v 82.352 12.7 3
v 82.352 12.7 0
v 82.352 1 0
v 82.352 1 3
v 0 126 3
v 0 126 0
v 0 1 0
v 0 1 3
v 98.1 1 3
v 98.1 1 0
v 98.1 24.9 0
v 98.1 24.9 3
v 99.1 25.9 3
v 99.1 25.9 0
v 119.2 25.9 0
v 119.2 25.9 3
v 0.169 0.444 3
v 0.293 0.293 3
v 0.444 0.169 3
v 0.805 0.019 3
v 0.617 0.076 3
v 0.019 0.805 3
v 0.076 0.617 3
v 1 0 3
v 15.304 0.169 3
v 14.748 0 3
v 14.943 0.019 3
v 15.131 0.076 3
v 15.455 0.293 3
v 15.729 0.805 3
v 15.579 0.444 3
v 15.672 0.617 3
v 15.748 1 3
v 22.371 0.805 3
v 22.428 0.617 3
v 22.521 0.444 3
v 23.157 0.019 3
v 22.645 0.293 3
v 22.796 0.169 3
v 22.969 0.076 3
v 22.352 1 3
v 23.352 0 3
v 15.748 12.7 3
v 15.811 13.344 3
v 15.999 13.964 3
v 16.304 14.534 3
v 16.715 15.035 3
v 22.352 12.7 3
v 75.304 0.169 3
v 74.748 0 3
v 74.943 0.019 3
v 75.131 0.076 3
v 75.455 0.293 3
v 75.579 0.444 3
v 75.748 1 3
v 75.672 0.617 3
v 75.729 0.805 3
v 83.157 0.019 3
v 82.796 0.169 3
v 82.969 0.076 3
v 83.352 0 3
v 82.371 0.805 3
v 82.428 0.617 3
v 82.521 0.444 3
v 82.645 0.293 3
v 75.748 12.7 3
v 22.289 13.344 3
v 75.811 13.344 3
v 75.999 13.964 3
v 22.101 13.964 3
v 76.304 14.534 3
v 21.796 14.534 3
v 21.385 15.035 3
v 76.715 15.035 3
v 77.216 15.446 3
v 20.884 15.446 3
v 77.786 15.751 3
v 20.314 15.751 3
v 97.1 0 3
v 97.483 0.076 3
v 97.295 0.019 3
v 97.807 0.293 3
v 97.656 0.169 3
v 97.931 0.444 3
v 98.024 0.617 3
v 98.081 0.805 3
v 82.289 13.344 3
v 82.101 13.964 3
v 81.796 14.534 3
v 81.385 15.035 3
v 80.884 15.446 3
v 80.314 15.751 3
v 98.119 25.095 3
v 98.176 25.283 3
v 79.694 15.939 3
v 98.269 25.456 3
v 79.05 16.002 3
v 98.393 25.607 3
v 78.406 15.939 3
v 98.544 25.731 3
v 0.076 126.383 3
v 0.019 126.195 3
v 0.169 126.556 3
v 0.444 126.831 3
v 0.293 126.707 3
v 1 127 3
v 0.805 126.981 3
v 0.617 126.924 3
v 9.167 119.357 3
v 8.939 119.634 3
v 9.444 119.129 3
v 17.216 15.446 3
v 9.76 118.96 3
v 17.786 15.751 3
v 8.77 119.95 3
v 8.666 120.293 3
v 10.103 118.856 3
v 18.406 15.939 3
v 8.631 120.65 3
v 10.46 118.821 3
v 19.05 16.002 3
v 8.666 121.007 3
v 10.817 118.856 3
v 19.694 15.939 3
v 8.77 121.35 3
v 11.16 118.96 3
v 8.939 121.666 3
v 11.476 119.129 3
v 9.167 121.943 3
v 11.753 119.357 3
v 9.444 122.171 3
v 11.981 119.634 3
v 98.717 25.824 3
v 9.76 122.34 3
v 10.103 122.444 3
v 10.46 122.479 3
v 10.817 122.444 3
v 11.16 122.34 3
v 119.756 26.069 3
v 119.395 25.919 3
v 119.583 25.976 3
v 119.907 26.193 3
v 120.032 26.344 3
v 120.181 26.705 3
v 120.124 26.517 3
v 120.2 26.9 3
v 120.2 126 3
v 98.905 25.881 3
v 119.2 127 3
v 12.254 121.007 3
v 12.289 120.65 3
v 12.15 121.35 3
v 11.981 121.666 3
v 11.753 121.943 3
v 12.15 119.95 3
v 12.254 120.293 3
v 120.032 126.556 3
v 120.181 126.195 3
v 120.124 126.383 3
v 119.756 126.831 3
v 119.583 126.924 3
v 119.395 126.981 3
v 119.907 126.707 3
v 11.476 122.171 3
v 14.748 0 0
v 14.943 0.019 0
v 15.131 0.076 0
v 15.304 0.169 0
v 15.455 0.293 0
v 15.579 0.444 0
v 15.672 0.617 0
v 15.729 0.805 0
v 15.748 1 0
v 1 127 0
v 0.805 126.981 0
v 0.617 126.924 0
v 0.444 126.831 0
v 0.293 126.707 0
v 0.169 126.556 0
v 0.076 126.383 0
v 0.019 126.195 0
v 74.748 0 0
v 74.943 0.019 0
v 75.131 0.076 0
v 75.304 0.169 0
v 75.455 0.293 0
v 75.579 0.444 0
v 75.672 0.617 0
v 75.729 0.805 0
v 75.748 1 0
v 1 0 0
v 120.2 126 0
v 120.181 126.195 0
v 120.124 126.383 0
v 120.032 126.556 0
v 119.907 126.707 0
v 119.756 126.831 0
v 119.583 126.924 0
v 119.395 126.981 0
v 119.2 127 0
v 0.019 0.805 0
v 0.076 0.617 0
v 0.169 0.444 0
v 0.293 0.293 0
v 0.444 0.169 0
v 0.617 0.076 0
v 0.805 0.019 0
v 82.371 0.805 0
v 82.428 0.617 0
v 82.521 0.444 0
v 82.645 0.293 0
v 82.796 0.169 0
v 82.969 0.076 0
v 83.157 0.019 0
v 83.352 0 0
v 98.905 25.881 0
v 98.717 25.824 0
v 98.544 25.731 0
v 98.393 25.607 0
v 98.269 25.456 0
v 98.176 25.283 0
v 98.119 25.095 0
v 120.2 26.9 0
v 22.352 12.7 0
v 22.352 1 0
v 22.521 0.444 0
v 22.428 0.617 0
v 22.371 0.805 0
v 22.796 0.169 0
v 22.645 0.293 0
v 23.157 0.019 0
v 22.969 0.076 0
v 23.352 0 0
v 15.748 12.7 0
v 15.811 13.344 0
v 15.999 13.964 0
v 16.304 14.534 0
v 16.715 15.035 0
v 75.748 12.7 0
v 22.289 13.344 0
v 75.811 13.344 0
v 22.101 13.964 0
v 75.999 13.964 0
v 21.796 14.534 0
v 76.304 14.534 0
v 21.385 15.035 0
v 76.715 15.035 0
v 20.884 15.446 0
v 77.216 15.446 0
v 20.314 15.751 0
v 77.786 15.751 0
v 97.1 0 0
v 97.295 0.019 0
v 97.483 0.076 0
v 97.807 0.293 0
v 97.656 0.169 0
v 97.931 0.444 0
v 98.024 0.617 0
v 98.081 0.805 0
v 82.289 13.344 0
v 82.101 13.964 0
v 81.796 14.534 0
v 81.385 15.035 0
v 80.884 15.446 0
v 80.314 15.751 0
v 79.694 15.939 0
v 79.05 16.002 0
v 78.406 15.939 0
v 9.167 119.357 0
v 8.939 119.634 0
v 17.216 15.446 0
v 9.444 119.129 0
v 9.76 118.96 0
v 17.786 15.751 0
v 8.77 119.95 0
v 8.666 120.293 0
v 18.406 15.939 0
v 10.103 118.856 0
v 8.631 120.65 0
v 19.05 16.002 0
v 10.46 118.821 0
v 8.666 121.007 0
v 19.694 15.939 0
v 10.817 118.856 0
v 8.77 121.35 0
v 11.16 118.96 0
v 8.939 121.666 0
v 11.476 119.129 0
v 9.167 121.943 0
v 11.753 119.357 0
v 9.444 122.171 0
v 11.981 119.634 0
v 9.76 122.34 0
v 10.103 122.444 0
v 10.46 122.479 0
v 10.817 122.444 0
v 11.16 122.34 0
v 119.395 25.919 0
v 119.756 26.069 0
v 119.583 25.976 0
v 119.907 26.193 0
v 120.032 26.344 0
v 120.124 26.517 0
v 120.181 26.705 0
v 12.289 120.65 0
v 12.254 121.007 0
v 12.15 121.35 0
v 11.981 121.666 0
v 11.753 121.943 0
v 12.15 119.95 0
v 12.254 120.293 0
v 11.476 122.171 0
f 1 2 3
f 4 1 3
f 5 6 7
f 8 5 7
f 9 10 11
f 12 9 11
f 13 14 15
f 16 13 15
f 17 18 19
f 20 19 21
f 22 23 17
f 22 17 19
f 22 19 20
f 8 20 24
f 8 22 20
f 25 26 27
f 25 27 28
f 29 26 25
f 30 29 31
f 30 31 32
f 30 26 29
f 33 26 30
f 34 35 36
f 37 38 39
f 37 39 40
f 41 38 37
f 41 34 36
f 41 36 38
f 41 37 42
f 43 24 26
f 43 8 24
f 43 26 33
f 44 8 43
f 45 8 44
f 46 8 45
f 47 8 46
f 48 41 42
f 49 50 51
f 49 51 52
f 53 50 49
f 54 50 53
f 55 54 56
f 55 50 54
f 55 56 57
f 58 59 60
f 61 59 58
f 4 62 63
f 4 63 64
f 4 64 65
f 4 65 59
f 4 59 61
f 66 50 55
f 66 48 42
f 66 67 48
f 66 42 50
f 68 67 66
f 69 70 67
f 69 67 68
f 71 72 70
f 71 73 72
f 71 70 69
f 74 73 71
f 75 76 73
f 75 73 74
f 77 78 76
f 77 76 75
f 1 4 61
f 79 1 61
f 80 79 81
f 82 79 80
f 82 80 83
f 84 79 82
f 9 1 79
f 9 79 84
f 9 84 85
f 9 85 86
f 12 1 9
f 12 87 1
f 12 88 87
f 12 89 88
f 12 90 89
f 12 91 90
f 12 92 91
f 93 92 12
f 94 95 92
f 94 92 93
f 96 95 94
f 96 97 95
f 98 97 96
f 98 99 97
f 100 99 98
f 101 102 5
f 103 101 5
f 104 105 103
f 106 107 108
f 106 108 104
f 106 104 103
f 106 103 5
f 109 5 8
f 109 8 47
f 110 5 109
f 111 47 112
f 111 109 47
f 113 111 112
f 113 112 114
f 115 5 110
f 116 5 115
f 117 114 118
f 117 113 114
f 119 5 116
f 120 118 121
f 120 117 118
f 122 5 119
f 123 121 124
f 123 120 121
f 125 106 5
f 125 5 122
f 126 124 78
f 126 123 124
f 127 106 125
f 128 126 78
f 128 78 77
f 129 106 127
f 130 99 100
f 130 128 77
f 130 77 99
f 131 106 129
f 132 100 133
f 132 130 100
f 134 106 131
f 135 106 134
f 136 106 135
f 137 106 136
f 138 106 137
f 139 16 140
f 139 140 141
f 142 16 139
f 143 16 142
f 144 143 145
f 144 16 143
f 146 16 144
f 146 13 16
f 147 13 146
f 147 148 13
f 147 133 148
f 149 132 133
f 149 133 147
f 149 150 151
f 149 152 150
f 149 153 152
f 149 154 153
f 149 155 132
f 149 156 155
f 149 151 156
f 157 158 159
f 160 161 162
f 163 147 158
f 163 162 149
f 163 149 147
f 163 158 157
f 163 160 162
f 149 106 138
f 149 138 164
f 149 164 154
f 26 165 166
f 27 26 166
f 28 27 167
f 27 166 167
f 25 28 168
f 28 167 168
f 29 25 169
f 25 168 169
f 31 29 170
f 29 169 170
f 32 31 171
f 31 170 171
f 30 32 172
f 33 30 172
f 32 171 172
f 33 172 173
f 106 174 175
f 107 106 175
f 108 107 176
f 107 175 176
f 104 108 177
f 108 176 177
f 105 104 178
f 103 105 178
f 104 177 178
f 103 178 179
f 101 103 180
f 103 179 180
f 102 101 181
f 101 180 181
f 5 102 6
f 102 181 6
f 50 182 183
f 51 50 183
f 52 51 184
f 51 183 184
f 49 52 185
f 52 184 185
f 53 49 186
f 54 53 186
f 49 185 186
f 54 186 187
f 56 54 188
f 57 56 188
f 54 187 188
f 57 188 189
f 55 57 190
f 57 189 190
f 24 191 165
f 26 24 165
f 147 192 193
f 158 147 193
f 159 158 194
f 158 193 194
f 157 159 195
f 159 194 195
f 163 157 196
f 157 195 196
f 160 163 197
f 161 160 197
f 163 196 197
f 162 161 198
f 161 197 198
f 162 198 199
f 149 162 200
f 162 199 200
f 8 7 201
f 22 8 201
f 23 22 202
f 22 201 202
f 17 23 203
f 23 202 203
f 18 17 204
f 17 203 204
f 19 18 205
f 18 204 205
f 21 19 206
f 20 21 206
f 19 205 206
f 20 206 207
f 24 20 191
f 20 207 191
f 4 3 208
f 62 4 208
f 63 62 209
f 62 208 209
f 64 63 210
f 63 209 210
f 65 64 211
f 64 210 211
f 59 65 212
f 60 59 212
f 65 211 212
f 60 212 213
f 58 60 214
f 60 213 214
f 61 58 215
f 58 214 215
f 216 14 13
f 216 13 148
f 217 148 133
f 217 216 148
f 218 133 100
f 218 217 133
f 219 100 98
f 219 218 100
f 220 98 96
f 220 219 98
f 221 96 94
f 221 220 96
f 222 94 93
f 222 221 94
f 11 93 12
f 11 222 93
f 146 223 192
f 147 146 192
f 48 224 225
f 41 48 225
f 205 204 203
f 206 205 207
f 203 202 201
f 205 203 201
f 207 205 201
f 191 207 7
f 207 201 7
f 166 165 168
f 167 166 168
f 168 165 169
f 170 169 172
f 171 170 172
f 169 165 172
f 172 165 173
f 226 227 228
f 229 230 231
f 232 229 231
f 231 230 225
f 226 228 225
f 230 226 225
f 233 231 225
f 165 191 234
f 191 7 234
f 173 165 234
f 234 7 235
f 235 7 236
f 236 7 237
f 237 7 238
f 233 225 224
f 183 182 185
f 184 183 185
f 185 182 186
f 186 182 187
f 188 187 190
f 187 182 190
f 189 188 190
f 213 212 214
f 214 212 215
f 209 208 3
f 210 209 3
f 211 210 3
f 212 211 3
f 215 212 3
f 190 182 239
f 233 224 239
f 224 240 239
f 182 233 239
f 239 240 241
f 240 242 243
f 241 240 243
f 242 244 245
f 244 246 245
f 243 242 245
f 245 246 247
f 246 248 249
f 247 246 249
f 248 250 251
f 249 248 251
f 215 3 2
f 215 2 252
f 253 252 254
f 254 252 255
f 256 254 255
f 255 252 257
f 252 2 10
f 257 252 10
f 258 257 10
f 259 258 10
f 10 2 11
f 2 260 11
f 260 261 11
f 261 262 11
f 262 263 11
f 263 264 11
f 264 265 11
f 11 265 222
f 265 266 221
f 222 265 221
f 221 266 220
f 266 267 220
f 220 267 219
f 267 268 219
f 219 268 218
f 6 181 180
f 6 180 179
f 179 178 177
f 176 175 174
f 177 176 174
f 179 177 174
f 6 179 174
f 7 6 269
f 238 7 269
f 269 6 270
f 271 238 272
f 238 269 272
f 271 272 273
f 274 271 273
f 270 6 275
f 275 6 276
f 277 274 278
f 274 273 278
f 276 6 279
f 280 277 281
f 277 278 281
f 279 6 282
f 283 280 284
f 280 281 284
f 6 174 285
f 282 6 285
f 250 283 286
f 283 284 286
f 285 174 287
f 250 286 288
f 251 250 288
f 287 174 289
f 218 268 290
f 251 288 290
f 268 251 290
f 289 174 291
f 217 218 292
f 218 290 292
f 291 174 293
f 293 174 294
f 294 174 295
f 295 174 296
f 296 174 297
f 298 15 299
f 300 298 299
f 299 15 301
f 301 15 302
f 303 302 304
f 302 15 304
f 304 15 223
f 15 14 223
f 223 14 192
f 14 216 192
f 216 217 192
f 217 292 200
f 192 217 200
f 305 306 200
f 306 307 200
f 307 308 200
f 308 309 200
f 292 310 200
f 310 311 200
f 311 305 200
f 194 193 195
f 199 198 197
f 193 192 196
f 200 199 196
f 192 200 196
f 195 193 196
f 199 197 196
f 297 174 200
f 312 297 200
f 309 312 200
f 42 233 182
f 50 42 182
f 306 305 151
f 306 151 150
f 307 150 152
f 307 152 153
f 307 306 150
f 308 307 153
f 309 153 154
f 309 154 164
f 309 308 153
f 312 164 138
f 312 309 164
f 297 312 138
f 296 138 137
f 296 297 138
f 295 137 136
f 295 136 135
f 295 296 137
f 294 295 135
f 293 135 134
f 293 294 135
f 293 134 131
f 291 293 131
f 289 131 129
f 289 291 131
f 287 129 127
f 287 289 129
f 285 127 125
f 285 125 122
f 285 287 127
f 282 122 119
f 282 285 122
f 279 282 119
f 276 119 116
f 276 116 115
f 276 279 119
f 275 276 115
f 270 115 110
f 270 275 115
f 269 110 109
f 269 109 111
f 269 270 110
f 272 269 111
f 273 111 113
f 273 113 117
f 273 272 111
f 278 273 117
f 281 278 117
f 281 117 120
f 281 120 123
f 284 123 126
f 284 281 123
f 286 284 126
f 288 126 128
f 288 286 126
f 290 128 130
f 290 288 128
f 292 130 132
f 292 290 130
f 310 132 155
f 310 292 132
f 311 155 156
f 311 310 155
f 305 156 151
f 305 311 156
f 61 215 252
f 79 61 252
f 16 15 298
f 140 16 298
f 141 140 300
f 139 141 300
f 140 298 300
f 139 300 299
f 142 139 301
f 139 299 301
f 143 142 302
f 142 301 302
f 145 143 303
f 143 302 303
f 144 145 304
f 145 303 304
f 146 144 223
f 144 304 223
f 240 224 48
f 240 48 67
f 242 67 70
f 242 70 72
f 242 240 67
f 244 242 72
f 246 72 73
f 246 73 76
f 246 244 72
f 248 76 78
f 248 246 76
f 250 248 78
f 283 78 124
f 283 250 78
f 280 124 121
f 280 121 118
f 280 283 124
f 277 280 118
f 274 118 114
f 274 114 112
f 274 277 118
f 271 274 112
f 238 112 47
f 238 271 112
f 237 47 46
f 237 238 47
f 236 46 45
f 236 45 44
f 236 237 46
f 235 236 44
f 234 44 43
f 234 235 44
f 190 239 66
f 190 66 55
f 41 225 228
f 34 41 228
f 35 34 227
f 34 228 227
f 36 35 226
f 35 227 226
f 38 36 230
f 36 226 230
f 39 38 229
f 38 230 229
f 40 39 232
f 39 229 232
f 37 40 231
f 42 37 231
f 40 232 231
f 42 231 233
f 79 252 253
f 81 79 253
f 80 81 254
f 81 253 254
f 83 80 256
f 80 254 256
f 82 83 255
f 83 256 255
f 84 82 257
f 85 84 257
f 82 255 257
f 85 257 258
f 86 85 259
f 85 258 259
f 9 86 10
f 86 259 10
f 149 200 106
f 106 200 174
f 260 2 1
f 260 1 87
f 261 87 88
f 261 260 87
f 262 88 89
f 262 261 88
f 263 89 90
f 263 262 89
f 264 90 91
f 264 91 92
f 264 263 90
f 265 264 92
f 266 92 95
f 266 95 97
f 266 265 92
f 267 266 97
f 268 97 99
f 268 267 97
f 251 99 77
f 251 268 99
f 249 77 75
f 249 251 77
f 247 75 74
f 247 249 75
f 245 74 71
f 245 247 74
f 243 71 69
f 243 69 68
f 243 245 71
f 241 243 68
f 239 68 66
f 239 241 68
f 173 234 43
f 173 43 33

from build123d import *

# Parameters (mm, degrees)
SKETCH_R  = 1.8288
PAD_DEPTH = 3


with BuildPart() as part:
    # Sketch → Pad (new body)
    with BuildSketch(Plane.XY):
        with BuildLine():
            Line((0, 126), (0, 1))
            ThreePointArc((0, 1), (0.292893, 0.292893), (1, 0))
            Line((1, 0), (14.748, 0))
            ThreePointArc((14.748, 0), (15.455107, 0.292893), (15.748, 1))
            Line((15.748, 12.7), (15.748, 1))
            ThreePointArc((22.352, 12.7), (19.05, 16.002), (15.748, 12.7))
            Line((22.352, 12.7), (22.352, 1))
            ThreePointArc((22.352, 1), (22.644893, 0.292893), (23.352, 0))
            Line((23.352, 0), (74.748, 0))
            ThreePointArc((74.748, 0), (75.455107, 0.292893), (75.748, 1))
            Line((75.748, 12.7), (75.748, 1))
            ThreePointArc((82.352, 12.7), (79.05, 16.002), (75.748, 12.7))
            Line((82.352, 12.7), (82.352, 1))
            ThreePointArc((82.352, 1), (82.644893, 0.292893), (83.352, 0))
            Line((83.352, 0), (97.1, 0))
            ThreePointArc((97.1, 0), (97.807107, 0.292893), (98.1, 1))
            Line((98.1, 1), (98.1, 24.9))
            ThreePointArc((99.1, 25.9), (98.392893, 25.607107), (98.1, 24.9))
            Line((99.1, 25.9), (119.2001, 25.9))
            ThreePointArc((119.2001, 25.9), (119.907207, 26.192893), (120.2001, 26.9))
            Line((120.2001, 26.9), (120.2001, 126))
            ThreePointArc((120.2001, 126), (119.907207, 126.707107), (119.2001, 127))
            Line((119.2001, 127), (1, 127))
            ThreePointArc((1, 127), (0.292893, 126.707107), (0, 126))
        make_face()
        with Locations((10.46, 120.65)):
            Circle(SKETCH_R, mode=Mode.SUBTRACT)
    extrude(amount=PAD_DEPTH)


solid = part.part
